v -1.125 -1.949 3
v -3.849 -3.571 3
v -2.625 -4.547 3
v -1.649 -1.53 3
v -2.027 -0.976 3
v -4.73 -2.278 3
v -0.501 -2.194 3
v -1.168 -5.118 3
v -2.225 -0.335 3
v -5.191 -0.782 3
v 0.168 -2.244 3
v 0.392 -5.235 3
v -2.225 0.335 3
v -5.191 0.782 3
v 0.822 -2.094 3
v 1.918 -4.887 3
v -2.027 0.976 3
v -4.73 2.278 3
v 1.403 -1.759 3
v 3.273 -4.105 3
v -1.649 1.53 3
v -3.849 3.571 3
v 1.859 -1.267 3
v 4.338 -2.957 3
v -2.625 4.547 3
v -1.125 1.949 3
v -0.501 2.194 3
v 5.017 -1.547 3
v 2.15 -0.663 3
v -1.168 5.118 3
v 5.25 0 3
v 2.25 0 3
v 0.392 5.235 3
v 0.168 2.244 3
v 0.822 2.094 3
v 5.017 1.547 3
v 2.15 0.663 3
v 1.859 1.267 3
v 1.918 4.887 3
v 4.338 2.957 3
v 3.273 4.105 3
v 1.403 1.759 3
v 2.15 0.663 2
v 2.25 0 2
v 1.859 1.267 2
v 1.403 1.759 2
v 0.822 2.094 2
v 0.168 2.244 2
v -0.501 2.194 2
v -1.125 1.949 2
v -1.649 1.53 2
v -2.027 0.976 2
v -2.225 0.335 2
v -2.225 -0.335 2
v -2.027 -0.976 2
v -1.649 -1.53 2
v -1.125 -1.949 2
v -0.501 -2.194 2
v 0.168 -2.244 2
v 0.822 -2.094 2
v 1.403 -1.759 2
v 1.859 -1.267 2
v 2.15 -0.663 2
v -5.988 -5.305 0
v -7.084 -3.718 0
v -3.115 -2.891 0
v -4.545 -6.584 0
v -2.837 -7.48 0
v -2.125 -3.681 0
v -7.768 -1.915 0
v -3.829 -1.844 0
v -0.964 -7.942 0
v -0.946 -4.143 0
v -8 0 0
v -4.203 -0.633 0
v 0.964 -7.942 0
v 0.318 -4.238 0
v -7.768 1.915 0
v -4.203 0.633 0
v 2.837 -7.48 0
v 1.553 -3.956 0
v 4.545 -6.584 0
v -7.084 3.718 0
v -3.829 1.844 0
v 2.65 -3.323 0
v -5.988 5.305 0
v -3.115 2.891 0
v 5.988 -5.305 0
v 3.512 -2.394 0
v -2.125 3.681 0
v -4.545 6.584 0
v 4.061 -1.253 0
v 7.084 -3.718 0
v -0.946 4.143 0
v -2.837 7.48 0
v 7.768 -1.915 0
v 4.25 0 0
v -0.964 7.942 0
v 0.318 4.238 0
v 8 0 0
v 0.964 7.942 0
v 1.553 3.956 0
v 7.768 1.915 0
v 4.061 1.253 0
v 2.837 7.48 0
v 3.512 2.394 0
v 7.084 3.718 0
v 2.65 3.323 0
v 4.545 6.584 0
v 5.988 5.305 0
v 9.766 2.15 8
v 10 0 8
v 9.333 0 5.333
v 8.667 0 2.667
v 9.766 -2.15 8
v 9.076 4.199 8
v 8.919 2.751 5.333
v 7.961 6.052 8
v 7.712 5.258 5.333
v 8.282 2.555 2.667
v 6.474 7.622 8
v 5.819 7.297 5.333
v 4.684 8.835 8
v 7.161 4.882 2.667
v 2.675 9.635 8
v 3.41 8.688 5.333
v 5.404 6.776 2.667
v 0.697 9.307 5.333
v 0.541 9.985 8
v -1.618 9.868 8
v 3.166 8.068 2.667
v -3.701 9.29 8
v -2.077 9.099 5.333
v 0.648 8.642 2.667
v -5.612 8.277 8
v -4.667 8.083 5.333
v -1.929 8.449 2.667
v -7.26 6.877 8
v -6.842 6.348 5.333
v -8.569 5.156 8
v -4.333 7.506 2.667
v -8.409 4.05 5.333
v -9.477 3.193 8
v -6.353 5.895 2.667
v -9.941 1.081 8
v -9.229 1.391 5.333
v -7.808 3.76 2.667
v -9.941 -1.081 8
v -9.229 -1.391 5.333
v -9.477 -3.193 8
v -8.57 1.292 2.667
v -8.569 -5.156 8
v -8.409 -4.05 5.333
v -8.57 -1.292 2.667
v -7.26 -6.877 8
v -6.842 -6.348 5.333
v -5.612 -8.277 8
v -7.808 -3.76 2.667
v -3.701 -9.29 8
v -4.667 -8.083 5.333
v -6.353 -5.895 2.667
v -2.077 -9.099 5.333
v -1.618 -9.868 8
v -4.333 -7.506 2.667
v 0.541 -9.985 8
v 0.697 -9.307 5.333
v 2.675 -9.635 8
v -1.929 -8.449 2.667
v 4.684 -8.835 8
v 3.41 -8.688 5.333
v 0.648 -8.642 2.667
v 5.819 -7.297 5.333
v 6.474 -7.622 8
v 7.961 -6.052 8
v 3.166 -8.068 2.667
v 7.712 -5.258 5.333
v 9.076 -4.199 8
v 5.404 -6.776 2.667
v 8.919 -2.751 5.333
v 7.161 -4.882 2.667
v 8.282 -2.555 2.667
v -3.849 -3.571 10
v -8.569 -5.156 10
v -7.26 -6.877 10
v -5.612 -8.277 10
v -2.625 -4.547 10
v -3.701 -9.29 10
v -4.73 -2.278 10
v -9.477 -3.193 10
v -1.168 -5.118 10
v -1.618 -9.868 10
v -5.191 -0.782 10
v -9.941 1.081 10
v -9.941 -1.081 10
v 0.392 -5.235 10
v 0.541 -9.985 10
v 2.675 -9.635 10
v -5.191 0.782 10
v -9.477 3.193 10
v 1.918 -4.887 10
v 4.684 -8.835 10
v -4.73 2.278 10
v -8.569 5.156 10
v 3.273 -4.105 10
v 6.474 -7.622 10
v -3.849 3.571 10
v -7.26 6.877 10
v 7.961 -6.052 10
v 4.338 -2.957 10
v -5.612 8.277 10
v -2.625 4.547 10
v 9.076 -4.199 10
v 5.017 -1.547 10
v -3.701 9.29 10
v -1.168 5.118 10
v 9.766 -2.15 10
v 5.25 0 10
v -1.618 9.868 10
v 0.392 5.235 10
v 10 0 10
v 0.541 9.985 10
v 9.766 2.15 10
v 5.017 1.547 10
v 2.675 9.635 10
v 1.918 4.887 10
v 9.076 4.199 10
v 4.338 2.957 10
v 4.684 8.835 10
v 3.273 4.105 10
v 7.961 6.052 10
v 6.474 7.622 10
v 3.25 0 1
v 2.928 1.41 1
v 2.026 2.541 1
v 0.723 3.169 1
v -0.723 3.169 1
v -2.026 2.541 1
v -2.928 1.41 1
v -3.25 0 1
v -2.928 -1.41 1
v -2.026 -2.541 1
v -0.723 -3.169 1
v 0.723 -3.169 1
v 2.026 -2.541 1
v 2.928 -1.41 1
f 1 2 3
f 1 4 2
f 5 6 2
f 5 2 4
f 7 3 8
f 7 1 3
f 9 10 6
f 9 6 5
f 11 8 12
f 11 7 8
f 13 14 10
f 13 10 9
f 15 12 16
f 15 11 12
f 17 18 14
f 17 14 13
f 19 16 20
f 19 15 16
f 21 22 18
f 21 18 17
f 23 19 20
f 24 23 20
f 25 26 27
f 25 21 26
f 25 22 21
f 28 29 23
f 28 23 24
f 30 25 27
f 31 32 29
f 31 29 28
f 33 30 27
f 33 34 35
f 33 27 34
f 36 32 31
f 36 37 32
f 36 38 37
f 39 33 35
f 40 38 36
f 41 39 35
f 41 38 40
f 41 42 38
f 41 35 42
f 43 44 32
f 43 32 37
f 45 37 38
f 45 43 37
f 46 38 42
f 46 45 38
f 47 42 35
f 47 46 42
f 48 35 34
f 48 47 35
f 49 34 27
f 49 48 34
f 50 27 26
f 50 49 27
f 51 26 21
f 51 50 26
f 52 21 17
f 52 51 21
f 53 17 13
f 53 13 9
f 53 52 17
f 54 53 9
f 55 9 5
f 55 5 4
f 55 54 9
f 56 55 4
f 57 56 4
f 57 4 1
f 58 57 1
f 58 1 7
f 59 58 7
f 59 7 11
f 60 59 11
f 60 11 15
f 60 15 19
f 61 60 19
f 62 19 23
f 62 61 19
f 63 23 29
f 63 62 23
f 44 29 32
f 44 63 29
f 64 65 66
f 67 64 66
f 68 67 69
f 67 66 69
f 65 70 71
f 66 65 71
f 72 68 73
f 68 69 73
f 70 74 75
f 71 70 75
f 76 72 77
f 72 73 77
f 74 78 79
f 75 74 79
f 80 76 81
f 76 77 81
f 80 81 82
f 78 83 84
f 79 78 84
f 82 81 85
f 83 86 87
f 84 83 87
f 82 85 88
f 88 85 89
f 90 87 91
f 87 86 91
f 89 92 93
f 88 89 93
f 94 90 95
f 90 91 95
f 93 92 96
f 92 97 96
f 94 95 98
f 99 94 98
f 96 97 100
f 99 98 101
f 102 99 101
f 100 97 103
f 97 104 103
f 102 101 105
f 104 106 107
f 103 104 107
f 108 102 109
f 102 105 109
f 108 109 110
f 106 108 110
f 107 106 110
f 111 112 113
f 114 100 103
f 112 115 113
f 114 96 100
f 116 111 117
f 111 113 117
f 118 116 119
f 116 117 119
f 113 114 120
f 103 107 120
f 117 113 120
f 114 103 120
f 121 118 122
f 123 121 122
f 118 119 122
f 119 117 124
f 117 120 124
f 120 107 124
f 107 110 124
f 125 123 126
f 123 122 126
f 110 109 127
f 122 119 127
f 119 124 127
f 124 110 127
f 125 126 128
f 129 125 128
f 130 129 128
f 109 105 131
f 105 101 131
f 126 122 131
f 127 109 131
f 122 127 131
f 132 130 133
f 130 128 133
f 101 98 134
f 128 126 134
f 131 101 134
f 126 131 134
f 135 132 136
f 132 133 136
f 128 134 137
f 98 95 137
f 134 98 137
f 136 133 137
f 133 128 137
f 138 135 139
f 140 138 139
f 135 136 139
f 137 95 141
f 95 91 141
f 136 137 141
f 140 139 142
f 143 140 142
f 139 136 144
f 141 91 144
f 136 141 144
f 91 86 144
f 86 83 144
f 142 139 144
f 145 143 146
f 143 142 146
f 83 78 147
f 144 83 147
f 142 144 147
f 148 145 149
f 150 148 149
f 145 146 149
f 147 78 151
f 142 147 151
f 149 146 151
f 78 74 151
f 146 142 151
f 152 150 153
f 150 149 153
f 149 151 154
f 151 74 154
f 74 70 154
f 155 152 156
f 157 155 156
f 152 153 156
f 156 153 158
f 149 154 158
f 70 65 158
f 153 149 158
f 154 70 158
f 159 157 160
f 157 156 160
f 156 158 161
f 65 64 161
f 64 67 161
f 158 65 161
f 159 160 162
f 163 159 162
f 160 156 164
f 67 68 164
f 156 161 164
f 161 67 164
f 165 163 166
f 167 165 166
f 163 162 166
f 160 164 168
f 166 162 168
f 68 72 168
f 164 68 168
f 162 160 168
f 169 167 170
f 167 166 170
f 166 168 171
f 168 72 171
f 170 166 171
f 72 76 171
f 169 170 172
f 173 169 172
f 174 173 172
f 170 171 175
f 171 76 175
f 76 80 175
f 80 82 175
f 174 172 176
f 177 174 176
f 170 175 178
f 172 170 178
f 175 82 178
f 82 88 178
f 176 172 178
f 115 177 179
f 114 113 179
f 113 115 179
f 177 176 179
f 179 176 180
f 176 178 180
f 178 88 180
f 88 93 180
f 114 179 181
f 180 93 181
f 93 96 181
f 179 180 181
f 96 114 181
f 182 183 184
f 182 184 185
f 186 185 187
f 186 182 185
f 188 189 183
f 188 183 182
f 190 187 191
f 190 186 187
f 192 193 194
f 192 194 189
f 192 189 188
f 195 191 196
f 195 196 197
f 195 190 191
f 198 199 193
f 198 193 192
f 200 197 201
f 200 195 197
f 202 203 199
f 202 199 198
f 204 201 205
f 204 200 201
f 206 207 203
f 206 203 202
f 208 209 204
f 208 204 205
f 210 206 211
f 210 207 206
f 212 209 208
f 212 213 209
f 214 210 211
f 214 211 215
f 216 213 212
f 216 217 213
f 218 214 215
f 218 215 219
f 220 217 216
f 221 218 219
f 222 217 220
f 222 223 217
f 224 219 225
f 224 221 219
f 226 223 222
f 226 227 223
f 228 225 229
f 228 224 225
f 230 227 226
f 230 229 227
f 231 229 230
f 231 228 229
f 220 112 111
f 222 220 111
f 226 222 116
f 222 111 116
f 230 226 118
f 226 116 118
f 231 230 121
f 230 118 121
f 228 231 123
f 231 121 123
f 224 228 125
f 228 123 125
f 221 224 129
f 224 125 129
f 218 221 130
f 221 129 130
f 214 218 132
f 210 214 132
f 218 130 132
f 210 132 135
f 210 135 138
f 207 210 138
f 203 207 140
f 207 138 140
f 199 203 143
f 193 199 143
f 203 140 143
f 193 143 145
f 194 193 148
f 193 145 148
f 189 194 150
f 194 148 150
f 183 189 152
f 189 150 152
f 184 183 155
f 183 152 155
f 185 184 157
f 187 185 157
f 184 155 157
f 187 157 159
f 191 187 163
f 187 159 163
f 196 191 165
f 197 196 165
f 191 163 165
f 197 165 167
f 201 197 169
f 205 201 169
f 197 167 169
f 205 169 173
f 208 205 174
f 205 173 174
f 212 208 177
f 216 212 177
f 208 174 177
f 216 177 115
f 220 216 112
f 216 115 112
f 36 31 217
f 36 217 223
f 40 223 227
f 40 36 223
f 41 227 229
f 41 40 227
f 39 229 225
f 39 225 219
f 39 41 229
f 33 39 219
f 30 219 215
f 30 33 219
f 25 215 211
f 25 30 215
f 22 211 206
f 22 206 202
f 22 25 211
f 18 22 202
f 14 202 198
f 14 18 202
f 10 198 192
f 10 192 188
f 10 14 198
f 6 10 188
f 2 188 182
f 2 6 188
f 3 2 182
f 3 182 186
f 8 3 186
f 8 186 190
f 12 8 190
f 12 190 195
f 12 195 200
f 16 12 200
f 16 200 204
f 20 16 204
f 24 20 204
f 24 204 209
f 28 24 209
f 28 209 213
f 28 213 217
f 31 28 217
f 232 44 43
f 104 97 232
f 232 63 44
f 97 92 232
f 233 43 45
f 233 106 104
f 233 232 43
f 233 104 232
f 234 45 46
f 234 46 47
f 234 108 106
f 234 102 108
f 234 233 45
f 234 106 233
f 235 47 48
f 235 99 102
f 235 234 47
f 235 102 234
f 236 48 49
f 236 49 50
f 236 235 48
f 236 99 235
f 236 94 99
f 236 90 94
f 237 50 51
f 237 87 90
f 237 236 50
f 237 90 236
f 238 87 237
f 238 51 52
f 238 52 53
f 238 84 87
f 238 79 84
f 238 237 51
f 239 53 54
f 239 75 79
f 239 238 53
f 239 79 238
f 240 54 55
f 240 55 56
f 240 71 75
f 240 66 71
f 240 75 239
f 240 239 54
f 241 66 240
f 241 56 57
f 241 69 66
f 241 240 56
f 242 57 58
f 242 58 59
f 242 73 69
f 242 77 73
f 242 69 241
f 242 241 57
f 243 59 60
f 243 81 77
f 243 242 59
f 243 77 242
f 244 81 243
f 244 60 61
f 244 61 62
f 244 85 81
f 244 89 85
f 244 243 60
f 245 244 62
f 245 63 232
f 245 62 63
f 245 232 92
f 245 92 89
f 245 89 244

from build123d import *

# Parameters (mm, degrees)
F0_R     = 10
F0_R_2   = 5.25
F1_DEPTH = 10
F2_R     = 5.25
F2_R_2   = 2.25
F3_DEPTH = 3
F4_SIZE  = 2
F5_SIZE2 = 2
F5_SIZE  = 8


with BuildPart() as f1:
    # F0 (on Top) → F1 (new body)
    with BuildSketch(Plane.XY):
        Circle(F0_R)
        Circle(F0_R_2, mode=Mode.SUBTRACT)
    extrude(amount=F1_DEPTH)

    # F2 (on Top) → F3 (join)
    with BuildSketch(Plane.XY):
        Circle(F2_R)
        Circle(F2_R_2, mode=Mode.SUBTRACT)
    extrude(amount=F3_DEPTH)

    # F4
    f4_edges = [f1.edges().sort_by_distance(p)[0] for p in [
        (-2.25, 0, 0),
    ]]
    chamfer(f4_edges, length=F4_SIZE)

    # F5
    f5_edges = [f1.edges().sort_by_distance(p)[0] for p in [
        (-10, 0, 0),
    ]]
    f5_side = f1.faces().sort_by_distance((-10, 0, 5))[0]
    chamfer(f5_edges, length=F5_SIZE, length2=F5_SIZE2, reference=f5_side)


solid = f1.part
